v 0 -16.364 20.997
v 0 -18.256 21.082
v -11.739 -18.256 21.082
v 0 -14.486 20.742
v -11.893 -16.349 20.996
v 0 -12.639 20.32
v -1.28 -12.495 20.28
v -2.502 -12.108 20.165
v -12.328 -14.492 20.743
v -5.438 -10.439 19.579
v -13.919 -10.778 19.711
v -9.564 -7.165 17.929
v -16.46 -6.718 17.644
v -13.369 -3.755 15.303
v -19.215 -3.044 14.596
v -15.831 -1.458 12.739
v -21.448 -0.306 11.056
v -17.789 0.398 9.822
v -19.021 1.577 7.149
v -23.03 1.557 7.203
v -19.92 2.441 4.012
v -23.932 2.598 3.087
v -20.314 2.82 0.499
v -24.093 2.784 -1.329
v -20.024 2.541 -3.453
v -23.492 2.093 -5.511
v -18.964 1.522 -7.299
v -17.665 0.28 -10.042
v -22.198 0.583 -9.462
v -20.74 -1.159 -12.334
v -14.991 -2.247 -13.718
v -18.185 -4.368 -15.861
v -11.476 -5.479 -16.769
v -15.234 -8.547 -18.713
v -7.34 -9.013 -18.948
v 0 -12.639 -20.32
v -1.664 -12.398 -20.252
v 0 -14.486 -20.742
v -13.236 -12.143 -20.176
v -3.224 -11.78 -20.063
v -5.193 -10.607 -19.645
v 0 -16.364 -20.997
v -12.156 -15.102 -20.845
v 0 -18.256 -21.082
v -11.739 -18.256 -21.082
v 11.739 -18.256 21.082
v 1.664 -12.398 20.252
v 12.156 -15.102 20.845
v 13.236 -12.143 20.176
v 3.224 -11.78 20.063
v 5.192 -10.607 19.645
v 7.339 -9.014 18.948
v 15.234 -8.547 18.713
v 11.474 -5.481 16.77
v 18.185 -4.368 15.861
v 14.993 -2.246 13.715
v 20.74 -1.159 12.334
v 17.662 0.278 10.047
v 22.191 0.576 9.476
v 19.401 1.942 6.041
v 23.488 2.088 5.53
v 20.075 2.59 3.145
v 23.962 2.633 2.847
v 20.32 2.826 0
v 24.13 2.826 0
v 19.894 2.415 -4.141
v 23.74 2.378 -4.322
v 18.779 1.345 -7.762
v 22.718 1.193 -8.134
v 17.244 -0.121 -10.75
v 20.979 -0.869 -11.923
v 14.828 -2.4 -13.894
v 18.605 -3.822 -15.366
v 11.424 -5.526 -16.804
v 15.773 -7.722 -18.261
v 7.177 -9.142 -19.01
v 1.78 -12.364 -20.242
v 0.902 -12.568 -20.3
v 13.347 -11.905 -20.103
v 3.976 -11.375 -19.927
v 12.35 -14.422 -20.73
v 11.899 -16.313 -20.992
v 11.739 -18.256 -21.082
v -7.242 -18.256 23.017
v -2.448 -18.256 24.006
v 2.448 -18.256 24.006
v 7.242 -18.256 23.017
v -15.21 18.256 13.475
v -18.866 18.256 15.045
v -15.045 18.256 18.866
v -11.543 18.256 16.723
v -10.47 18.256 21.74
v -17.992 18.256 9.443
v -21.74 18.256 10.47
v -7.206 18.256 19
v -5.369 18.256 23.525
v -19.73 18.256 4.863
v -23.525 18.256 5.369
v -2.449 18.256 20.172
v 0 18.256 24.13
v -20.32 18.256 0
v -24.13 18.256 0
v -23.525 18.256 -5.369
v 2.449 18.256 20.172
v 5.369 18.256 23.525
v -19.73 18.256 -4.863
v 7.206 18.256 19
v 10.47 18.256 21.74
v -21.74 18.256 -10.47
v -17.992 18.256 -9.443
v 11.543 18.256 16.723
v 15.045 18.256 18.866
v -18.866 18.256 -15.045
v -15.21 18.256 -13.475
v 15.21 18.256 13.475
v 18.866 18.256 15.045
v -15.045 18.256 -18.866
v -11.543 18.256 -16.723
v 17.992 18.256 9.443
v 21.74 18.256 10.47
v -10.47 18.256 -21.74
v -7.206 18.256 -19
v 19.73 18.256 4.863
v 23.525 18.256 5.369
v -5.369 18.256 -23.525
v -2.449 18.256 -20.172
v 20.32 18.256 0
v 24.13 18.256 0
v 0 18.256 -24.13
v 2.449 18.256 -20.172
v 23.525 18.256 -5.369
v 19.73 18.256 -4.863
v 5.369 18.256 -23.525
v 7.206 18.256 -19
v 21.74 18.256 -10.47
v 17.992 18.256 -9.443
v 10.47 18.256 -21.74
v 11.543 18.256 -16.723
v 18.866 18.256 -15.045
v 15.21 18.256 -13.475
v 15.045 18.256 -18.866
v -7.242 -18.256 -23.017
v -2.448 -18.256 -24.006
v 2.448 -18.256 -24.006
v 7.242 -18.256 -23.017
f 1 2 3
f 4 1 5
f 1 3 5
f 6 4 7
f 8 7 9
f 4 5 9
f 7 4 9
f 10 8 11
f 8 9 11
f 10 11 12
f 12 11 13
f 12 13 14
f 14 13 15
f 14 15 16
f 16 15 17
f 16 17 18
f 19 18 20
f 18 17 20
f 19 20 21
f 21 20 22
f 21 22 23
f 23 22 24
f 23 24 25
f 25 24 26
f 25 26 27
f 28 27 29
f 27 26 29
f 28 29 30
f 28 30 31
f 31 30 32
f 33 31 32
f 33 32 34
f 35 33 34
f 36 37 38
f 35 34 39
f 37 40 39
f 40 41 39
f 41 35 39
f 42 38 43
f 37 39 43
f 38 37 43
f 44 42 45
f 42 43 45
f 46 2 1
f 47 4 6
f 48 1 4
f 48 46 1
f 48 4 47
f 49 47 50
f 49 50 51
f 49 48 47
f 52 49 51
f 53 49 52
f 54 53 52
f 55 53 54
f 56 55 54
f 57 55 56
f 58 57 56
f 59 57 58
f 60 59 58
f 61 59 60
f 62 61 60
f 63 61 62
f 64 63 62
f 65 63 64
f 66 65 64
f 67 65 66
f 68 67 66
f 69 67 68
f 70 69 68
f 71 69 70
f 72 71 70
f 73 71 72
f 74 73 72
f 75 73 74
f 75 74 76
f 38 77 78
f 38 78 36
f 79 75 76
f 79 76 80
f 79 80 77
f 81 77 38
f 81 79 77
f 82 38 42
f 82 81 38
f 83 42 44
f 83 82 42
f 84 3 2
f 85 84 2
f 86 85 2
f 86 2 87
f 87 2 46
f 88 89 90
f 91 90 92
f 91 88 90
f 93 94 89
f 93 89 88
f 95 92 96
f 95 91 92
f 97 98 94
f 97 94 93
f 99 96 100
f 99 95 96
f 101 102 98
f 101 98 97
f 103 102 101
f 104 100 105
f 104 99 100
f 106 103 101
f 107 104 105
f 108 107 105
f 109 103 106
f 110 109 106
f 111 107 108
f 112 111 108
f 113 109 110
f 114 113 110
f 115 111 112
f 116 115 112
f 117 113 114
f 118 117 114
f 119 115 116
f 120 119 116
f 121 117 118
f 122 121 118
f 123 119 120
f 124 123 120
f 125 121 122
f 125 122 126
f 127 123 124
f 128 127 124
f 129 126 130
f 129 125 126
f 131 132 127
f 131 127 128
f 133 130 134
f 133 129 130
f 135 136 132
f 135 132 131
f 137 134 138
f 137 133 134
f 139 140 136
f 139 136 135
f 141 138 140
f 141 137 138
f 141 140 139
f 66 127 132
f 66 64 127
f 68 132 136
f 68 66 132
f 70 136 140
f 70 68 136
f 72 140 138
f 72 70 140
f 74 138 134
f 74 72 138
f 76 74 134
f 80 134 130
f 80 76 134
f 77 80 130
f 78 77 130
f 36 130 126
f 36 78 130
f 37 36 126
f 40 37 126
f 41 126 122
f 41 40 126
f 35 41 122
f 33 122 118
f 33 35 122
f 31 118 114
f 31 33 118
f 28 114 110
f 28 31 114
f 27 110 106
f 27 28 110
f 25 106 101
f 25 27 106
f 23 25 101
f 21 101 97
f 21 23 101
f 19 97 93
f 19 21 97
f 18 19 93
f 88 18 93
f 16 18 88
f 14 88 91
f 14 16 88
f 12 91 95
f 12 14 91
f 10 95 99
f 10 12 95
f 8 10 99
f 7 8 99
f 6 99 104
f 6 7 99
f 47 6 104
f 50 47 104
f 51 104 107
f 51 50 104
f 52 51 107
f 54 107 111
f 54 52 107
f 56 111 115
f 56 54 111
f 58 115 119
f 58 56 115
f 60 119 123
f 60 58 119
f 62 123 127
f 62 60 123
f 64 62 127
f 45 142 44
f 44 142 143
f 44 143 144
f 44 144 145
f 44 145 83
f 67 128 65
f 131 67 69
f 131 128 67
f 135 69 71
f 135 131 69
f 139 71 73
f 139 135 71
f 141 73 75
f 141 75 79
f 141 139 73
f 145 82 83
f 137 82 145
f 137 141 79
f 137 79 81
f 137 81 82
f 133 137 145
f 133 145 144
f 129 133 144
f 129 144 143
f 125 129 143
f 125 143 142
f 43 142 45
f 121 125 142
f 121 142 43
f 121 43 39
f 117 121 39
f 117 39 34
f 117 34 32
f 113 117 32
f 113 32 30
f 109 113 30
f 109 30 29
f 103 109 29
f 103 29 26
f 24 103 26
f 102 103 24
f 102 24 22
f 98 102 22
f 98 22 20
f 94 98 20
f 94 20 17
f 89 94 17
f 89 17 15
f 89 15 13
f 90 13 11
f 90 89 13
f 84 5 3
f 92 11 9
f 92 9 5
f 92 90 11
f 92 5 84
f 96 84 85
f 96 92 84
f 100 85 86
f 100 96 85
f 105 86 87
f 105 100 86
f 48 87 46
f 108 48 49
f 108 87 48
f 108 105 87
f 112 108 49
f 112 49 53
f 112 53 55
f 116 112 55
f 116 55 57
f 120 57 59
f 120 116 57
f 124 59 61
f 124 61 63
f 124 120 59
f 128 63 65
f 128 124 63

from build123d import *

# Parameters (mm, degrees)
SKETCH1_R           = 24.13
SKETCH1_R_2         = 20.32
BOSS_EXTRUDE1_DEPTH = 18.25625
SKETCH6_W           = 21.082
SKETCH6_H           = 24.13


with BuildPart() as part:
    # Sketch1 → Boss-Extrude1 (new body, symmetric)
    with BuildSketch(Plane(origin=(0, 0, 0), x_dir=(1, 0, 0), z_dir=(0, 1, 0))):
        Circle(SKETCH1_R)
        Circle(SKETCH1_R_2, mode=Mode.SUBTRACT)
    extrude(amount=BOSS_EXTRUDE1_DEPTH, both=True)

    # Sketch6 → 3/32 (1.66) Dowel Hole1 (revolve, cut)
    with BuildSketch(Plane(origin=(0, -18.25625, 0), x_dir=(0, 0, -1), z_dir=(0, 1, 0))):
        with Locations((10.541, 12.065)):
            Rectangle(SKETCH6_W, SKETCH6_H)
    f_3_32_1_66_dowel_hole1 = revolve(axis=Axis((6.35, -18.25625, 0), (-1, 0, 0)), mode=Mode.SUBTRACT)

    # Mirror1: 3/32 (1.66) Dowel Hole1 across plane
    add(f_3_32_1_66_dowel_hole1.mirror(Plane(origin=(0, 0, 0), x_dir=(0, 0, 1), z_dir=(1, 0, 0))), mode=Mode.SUBTRACT)


solid = part.part
